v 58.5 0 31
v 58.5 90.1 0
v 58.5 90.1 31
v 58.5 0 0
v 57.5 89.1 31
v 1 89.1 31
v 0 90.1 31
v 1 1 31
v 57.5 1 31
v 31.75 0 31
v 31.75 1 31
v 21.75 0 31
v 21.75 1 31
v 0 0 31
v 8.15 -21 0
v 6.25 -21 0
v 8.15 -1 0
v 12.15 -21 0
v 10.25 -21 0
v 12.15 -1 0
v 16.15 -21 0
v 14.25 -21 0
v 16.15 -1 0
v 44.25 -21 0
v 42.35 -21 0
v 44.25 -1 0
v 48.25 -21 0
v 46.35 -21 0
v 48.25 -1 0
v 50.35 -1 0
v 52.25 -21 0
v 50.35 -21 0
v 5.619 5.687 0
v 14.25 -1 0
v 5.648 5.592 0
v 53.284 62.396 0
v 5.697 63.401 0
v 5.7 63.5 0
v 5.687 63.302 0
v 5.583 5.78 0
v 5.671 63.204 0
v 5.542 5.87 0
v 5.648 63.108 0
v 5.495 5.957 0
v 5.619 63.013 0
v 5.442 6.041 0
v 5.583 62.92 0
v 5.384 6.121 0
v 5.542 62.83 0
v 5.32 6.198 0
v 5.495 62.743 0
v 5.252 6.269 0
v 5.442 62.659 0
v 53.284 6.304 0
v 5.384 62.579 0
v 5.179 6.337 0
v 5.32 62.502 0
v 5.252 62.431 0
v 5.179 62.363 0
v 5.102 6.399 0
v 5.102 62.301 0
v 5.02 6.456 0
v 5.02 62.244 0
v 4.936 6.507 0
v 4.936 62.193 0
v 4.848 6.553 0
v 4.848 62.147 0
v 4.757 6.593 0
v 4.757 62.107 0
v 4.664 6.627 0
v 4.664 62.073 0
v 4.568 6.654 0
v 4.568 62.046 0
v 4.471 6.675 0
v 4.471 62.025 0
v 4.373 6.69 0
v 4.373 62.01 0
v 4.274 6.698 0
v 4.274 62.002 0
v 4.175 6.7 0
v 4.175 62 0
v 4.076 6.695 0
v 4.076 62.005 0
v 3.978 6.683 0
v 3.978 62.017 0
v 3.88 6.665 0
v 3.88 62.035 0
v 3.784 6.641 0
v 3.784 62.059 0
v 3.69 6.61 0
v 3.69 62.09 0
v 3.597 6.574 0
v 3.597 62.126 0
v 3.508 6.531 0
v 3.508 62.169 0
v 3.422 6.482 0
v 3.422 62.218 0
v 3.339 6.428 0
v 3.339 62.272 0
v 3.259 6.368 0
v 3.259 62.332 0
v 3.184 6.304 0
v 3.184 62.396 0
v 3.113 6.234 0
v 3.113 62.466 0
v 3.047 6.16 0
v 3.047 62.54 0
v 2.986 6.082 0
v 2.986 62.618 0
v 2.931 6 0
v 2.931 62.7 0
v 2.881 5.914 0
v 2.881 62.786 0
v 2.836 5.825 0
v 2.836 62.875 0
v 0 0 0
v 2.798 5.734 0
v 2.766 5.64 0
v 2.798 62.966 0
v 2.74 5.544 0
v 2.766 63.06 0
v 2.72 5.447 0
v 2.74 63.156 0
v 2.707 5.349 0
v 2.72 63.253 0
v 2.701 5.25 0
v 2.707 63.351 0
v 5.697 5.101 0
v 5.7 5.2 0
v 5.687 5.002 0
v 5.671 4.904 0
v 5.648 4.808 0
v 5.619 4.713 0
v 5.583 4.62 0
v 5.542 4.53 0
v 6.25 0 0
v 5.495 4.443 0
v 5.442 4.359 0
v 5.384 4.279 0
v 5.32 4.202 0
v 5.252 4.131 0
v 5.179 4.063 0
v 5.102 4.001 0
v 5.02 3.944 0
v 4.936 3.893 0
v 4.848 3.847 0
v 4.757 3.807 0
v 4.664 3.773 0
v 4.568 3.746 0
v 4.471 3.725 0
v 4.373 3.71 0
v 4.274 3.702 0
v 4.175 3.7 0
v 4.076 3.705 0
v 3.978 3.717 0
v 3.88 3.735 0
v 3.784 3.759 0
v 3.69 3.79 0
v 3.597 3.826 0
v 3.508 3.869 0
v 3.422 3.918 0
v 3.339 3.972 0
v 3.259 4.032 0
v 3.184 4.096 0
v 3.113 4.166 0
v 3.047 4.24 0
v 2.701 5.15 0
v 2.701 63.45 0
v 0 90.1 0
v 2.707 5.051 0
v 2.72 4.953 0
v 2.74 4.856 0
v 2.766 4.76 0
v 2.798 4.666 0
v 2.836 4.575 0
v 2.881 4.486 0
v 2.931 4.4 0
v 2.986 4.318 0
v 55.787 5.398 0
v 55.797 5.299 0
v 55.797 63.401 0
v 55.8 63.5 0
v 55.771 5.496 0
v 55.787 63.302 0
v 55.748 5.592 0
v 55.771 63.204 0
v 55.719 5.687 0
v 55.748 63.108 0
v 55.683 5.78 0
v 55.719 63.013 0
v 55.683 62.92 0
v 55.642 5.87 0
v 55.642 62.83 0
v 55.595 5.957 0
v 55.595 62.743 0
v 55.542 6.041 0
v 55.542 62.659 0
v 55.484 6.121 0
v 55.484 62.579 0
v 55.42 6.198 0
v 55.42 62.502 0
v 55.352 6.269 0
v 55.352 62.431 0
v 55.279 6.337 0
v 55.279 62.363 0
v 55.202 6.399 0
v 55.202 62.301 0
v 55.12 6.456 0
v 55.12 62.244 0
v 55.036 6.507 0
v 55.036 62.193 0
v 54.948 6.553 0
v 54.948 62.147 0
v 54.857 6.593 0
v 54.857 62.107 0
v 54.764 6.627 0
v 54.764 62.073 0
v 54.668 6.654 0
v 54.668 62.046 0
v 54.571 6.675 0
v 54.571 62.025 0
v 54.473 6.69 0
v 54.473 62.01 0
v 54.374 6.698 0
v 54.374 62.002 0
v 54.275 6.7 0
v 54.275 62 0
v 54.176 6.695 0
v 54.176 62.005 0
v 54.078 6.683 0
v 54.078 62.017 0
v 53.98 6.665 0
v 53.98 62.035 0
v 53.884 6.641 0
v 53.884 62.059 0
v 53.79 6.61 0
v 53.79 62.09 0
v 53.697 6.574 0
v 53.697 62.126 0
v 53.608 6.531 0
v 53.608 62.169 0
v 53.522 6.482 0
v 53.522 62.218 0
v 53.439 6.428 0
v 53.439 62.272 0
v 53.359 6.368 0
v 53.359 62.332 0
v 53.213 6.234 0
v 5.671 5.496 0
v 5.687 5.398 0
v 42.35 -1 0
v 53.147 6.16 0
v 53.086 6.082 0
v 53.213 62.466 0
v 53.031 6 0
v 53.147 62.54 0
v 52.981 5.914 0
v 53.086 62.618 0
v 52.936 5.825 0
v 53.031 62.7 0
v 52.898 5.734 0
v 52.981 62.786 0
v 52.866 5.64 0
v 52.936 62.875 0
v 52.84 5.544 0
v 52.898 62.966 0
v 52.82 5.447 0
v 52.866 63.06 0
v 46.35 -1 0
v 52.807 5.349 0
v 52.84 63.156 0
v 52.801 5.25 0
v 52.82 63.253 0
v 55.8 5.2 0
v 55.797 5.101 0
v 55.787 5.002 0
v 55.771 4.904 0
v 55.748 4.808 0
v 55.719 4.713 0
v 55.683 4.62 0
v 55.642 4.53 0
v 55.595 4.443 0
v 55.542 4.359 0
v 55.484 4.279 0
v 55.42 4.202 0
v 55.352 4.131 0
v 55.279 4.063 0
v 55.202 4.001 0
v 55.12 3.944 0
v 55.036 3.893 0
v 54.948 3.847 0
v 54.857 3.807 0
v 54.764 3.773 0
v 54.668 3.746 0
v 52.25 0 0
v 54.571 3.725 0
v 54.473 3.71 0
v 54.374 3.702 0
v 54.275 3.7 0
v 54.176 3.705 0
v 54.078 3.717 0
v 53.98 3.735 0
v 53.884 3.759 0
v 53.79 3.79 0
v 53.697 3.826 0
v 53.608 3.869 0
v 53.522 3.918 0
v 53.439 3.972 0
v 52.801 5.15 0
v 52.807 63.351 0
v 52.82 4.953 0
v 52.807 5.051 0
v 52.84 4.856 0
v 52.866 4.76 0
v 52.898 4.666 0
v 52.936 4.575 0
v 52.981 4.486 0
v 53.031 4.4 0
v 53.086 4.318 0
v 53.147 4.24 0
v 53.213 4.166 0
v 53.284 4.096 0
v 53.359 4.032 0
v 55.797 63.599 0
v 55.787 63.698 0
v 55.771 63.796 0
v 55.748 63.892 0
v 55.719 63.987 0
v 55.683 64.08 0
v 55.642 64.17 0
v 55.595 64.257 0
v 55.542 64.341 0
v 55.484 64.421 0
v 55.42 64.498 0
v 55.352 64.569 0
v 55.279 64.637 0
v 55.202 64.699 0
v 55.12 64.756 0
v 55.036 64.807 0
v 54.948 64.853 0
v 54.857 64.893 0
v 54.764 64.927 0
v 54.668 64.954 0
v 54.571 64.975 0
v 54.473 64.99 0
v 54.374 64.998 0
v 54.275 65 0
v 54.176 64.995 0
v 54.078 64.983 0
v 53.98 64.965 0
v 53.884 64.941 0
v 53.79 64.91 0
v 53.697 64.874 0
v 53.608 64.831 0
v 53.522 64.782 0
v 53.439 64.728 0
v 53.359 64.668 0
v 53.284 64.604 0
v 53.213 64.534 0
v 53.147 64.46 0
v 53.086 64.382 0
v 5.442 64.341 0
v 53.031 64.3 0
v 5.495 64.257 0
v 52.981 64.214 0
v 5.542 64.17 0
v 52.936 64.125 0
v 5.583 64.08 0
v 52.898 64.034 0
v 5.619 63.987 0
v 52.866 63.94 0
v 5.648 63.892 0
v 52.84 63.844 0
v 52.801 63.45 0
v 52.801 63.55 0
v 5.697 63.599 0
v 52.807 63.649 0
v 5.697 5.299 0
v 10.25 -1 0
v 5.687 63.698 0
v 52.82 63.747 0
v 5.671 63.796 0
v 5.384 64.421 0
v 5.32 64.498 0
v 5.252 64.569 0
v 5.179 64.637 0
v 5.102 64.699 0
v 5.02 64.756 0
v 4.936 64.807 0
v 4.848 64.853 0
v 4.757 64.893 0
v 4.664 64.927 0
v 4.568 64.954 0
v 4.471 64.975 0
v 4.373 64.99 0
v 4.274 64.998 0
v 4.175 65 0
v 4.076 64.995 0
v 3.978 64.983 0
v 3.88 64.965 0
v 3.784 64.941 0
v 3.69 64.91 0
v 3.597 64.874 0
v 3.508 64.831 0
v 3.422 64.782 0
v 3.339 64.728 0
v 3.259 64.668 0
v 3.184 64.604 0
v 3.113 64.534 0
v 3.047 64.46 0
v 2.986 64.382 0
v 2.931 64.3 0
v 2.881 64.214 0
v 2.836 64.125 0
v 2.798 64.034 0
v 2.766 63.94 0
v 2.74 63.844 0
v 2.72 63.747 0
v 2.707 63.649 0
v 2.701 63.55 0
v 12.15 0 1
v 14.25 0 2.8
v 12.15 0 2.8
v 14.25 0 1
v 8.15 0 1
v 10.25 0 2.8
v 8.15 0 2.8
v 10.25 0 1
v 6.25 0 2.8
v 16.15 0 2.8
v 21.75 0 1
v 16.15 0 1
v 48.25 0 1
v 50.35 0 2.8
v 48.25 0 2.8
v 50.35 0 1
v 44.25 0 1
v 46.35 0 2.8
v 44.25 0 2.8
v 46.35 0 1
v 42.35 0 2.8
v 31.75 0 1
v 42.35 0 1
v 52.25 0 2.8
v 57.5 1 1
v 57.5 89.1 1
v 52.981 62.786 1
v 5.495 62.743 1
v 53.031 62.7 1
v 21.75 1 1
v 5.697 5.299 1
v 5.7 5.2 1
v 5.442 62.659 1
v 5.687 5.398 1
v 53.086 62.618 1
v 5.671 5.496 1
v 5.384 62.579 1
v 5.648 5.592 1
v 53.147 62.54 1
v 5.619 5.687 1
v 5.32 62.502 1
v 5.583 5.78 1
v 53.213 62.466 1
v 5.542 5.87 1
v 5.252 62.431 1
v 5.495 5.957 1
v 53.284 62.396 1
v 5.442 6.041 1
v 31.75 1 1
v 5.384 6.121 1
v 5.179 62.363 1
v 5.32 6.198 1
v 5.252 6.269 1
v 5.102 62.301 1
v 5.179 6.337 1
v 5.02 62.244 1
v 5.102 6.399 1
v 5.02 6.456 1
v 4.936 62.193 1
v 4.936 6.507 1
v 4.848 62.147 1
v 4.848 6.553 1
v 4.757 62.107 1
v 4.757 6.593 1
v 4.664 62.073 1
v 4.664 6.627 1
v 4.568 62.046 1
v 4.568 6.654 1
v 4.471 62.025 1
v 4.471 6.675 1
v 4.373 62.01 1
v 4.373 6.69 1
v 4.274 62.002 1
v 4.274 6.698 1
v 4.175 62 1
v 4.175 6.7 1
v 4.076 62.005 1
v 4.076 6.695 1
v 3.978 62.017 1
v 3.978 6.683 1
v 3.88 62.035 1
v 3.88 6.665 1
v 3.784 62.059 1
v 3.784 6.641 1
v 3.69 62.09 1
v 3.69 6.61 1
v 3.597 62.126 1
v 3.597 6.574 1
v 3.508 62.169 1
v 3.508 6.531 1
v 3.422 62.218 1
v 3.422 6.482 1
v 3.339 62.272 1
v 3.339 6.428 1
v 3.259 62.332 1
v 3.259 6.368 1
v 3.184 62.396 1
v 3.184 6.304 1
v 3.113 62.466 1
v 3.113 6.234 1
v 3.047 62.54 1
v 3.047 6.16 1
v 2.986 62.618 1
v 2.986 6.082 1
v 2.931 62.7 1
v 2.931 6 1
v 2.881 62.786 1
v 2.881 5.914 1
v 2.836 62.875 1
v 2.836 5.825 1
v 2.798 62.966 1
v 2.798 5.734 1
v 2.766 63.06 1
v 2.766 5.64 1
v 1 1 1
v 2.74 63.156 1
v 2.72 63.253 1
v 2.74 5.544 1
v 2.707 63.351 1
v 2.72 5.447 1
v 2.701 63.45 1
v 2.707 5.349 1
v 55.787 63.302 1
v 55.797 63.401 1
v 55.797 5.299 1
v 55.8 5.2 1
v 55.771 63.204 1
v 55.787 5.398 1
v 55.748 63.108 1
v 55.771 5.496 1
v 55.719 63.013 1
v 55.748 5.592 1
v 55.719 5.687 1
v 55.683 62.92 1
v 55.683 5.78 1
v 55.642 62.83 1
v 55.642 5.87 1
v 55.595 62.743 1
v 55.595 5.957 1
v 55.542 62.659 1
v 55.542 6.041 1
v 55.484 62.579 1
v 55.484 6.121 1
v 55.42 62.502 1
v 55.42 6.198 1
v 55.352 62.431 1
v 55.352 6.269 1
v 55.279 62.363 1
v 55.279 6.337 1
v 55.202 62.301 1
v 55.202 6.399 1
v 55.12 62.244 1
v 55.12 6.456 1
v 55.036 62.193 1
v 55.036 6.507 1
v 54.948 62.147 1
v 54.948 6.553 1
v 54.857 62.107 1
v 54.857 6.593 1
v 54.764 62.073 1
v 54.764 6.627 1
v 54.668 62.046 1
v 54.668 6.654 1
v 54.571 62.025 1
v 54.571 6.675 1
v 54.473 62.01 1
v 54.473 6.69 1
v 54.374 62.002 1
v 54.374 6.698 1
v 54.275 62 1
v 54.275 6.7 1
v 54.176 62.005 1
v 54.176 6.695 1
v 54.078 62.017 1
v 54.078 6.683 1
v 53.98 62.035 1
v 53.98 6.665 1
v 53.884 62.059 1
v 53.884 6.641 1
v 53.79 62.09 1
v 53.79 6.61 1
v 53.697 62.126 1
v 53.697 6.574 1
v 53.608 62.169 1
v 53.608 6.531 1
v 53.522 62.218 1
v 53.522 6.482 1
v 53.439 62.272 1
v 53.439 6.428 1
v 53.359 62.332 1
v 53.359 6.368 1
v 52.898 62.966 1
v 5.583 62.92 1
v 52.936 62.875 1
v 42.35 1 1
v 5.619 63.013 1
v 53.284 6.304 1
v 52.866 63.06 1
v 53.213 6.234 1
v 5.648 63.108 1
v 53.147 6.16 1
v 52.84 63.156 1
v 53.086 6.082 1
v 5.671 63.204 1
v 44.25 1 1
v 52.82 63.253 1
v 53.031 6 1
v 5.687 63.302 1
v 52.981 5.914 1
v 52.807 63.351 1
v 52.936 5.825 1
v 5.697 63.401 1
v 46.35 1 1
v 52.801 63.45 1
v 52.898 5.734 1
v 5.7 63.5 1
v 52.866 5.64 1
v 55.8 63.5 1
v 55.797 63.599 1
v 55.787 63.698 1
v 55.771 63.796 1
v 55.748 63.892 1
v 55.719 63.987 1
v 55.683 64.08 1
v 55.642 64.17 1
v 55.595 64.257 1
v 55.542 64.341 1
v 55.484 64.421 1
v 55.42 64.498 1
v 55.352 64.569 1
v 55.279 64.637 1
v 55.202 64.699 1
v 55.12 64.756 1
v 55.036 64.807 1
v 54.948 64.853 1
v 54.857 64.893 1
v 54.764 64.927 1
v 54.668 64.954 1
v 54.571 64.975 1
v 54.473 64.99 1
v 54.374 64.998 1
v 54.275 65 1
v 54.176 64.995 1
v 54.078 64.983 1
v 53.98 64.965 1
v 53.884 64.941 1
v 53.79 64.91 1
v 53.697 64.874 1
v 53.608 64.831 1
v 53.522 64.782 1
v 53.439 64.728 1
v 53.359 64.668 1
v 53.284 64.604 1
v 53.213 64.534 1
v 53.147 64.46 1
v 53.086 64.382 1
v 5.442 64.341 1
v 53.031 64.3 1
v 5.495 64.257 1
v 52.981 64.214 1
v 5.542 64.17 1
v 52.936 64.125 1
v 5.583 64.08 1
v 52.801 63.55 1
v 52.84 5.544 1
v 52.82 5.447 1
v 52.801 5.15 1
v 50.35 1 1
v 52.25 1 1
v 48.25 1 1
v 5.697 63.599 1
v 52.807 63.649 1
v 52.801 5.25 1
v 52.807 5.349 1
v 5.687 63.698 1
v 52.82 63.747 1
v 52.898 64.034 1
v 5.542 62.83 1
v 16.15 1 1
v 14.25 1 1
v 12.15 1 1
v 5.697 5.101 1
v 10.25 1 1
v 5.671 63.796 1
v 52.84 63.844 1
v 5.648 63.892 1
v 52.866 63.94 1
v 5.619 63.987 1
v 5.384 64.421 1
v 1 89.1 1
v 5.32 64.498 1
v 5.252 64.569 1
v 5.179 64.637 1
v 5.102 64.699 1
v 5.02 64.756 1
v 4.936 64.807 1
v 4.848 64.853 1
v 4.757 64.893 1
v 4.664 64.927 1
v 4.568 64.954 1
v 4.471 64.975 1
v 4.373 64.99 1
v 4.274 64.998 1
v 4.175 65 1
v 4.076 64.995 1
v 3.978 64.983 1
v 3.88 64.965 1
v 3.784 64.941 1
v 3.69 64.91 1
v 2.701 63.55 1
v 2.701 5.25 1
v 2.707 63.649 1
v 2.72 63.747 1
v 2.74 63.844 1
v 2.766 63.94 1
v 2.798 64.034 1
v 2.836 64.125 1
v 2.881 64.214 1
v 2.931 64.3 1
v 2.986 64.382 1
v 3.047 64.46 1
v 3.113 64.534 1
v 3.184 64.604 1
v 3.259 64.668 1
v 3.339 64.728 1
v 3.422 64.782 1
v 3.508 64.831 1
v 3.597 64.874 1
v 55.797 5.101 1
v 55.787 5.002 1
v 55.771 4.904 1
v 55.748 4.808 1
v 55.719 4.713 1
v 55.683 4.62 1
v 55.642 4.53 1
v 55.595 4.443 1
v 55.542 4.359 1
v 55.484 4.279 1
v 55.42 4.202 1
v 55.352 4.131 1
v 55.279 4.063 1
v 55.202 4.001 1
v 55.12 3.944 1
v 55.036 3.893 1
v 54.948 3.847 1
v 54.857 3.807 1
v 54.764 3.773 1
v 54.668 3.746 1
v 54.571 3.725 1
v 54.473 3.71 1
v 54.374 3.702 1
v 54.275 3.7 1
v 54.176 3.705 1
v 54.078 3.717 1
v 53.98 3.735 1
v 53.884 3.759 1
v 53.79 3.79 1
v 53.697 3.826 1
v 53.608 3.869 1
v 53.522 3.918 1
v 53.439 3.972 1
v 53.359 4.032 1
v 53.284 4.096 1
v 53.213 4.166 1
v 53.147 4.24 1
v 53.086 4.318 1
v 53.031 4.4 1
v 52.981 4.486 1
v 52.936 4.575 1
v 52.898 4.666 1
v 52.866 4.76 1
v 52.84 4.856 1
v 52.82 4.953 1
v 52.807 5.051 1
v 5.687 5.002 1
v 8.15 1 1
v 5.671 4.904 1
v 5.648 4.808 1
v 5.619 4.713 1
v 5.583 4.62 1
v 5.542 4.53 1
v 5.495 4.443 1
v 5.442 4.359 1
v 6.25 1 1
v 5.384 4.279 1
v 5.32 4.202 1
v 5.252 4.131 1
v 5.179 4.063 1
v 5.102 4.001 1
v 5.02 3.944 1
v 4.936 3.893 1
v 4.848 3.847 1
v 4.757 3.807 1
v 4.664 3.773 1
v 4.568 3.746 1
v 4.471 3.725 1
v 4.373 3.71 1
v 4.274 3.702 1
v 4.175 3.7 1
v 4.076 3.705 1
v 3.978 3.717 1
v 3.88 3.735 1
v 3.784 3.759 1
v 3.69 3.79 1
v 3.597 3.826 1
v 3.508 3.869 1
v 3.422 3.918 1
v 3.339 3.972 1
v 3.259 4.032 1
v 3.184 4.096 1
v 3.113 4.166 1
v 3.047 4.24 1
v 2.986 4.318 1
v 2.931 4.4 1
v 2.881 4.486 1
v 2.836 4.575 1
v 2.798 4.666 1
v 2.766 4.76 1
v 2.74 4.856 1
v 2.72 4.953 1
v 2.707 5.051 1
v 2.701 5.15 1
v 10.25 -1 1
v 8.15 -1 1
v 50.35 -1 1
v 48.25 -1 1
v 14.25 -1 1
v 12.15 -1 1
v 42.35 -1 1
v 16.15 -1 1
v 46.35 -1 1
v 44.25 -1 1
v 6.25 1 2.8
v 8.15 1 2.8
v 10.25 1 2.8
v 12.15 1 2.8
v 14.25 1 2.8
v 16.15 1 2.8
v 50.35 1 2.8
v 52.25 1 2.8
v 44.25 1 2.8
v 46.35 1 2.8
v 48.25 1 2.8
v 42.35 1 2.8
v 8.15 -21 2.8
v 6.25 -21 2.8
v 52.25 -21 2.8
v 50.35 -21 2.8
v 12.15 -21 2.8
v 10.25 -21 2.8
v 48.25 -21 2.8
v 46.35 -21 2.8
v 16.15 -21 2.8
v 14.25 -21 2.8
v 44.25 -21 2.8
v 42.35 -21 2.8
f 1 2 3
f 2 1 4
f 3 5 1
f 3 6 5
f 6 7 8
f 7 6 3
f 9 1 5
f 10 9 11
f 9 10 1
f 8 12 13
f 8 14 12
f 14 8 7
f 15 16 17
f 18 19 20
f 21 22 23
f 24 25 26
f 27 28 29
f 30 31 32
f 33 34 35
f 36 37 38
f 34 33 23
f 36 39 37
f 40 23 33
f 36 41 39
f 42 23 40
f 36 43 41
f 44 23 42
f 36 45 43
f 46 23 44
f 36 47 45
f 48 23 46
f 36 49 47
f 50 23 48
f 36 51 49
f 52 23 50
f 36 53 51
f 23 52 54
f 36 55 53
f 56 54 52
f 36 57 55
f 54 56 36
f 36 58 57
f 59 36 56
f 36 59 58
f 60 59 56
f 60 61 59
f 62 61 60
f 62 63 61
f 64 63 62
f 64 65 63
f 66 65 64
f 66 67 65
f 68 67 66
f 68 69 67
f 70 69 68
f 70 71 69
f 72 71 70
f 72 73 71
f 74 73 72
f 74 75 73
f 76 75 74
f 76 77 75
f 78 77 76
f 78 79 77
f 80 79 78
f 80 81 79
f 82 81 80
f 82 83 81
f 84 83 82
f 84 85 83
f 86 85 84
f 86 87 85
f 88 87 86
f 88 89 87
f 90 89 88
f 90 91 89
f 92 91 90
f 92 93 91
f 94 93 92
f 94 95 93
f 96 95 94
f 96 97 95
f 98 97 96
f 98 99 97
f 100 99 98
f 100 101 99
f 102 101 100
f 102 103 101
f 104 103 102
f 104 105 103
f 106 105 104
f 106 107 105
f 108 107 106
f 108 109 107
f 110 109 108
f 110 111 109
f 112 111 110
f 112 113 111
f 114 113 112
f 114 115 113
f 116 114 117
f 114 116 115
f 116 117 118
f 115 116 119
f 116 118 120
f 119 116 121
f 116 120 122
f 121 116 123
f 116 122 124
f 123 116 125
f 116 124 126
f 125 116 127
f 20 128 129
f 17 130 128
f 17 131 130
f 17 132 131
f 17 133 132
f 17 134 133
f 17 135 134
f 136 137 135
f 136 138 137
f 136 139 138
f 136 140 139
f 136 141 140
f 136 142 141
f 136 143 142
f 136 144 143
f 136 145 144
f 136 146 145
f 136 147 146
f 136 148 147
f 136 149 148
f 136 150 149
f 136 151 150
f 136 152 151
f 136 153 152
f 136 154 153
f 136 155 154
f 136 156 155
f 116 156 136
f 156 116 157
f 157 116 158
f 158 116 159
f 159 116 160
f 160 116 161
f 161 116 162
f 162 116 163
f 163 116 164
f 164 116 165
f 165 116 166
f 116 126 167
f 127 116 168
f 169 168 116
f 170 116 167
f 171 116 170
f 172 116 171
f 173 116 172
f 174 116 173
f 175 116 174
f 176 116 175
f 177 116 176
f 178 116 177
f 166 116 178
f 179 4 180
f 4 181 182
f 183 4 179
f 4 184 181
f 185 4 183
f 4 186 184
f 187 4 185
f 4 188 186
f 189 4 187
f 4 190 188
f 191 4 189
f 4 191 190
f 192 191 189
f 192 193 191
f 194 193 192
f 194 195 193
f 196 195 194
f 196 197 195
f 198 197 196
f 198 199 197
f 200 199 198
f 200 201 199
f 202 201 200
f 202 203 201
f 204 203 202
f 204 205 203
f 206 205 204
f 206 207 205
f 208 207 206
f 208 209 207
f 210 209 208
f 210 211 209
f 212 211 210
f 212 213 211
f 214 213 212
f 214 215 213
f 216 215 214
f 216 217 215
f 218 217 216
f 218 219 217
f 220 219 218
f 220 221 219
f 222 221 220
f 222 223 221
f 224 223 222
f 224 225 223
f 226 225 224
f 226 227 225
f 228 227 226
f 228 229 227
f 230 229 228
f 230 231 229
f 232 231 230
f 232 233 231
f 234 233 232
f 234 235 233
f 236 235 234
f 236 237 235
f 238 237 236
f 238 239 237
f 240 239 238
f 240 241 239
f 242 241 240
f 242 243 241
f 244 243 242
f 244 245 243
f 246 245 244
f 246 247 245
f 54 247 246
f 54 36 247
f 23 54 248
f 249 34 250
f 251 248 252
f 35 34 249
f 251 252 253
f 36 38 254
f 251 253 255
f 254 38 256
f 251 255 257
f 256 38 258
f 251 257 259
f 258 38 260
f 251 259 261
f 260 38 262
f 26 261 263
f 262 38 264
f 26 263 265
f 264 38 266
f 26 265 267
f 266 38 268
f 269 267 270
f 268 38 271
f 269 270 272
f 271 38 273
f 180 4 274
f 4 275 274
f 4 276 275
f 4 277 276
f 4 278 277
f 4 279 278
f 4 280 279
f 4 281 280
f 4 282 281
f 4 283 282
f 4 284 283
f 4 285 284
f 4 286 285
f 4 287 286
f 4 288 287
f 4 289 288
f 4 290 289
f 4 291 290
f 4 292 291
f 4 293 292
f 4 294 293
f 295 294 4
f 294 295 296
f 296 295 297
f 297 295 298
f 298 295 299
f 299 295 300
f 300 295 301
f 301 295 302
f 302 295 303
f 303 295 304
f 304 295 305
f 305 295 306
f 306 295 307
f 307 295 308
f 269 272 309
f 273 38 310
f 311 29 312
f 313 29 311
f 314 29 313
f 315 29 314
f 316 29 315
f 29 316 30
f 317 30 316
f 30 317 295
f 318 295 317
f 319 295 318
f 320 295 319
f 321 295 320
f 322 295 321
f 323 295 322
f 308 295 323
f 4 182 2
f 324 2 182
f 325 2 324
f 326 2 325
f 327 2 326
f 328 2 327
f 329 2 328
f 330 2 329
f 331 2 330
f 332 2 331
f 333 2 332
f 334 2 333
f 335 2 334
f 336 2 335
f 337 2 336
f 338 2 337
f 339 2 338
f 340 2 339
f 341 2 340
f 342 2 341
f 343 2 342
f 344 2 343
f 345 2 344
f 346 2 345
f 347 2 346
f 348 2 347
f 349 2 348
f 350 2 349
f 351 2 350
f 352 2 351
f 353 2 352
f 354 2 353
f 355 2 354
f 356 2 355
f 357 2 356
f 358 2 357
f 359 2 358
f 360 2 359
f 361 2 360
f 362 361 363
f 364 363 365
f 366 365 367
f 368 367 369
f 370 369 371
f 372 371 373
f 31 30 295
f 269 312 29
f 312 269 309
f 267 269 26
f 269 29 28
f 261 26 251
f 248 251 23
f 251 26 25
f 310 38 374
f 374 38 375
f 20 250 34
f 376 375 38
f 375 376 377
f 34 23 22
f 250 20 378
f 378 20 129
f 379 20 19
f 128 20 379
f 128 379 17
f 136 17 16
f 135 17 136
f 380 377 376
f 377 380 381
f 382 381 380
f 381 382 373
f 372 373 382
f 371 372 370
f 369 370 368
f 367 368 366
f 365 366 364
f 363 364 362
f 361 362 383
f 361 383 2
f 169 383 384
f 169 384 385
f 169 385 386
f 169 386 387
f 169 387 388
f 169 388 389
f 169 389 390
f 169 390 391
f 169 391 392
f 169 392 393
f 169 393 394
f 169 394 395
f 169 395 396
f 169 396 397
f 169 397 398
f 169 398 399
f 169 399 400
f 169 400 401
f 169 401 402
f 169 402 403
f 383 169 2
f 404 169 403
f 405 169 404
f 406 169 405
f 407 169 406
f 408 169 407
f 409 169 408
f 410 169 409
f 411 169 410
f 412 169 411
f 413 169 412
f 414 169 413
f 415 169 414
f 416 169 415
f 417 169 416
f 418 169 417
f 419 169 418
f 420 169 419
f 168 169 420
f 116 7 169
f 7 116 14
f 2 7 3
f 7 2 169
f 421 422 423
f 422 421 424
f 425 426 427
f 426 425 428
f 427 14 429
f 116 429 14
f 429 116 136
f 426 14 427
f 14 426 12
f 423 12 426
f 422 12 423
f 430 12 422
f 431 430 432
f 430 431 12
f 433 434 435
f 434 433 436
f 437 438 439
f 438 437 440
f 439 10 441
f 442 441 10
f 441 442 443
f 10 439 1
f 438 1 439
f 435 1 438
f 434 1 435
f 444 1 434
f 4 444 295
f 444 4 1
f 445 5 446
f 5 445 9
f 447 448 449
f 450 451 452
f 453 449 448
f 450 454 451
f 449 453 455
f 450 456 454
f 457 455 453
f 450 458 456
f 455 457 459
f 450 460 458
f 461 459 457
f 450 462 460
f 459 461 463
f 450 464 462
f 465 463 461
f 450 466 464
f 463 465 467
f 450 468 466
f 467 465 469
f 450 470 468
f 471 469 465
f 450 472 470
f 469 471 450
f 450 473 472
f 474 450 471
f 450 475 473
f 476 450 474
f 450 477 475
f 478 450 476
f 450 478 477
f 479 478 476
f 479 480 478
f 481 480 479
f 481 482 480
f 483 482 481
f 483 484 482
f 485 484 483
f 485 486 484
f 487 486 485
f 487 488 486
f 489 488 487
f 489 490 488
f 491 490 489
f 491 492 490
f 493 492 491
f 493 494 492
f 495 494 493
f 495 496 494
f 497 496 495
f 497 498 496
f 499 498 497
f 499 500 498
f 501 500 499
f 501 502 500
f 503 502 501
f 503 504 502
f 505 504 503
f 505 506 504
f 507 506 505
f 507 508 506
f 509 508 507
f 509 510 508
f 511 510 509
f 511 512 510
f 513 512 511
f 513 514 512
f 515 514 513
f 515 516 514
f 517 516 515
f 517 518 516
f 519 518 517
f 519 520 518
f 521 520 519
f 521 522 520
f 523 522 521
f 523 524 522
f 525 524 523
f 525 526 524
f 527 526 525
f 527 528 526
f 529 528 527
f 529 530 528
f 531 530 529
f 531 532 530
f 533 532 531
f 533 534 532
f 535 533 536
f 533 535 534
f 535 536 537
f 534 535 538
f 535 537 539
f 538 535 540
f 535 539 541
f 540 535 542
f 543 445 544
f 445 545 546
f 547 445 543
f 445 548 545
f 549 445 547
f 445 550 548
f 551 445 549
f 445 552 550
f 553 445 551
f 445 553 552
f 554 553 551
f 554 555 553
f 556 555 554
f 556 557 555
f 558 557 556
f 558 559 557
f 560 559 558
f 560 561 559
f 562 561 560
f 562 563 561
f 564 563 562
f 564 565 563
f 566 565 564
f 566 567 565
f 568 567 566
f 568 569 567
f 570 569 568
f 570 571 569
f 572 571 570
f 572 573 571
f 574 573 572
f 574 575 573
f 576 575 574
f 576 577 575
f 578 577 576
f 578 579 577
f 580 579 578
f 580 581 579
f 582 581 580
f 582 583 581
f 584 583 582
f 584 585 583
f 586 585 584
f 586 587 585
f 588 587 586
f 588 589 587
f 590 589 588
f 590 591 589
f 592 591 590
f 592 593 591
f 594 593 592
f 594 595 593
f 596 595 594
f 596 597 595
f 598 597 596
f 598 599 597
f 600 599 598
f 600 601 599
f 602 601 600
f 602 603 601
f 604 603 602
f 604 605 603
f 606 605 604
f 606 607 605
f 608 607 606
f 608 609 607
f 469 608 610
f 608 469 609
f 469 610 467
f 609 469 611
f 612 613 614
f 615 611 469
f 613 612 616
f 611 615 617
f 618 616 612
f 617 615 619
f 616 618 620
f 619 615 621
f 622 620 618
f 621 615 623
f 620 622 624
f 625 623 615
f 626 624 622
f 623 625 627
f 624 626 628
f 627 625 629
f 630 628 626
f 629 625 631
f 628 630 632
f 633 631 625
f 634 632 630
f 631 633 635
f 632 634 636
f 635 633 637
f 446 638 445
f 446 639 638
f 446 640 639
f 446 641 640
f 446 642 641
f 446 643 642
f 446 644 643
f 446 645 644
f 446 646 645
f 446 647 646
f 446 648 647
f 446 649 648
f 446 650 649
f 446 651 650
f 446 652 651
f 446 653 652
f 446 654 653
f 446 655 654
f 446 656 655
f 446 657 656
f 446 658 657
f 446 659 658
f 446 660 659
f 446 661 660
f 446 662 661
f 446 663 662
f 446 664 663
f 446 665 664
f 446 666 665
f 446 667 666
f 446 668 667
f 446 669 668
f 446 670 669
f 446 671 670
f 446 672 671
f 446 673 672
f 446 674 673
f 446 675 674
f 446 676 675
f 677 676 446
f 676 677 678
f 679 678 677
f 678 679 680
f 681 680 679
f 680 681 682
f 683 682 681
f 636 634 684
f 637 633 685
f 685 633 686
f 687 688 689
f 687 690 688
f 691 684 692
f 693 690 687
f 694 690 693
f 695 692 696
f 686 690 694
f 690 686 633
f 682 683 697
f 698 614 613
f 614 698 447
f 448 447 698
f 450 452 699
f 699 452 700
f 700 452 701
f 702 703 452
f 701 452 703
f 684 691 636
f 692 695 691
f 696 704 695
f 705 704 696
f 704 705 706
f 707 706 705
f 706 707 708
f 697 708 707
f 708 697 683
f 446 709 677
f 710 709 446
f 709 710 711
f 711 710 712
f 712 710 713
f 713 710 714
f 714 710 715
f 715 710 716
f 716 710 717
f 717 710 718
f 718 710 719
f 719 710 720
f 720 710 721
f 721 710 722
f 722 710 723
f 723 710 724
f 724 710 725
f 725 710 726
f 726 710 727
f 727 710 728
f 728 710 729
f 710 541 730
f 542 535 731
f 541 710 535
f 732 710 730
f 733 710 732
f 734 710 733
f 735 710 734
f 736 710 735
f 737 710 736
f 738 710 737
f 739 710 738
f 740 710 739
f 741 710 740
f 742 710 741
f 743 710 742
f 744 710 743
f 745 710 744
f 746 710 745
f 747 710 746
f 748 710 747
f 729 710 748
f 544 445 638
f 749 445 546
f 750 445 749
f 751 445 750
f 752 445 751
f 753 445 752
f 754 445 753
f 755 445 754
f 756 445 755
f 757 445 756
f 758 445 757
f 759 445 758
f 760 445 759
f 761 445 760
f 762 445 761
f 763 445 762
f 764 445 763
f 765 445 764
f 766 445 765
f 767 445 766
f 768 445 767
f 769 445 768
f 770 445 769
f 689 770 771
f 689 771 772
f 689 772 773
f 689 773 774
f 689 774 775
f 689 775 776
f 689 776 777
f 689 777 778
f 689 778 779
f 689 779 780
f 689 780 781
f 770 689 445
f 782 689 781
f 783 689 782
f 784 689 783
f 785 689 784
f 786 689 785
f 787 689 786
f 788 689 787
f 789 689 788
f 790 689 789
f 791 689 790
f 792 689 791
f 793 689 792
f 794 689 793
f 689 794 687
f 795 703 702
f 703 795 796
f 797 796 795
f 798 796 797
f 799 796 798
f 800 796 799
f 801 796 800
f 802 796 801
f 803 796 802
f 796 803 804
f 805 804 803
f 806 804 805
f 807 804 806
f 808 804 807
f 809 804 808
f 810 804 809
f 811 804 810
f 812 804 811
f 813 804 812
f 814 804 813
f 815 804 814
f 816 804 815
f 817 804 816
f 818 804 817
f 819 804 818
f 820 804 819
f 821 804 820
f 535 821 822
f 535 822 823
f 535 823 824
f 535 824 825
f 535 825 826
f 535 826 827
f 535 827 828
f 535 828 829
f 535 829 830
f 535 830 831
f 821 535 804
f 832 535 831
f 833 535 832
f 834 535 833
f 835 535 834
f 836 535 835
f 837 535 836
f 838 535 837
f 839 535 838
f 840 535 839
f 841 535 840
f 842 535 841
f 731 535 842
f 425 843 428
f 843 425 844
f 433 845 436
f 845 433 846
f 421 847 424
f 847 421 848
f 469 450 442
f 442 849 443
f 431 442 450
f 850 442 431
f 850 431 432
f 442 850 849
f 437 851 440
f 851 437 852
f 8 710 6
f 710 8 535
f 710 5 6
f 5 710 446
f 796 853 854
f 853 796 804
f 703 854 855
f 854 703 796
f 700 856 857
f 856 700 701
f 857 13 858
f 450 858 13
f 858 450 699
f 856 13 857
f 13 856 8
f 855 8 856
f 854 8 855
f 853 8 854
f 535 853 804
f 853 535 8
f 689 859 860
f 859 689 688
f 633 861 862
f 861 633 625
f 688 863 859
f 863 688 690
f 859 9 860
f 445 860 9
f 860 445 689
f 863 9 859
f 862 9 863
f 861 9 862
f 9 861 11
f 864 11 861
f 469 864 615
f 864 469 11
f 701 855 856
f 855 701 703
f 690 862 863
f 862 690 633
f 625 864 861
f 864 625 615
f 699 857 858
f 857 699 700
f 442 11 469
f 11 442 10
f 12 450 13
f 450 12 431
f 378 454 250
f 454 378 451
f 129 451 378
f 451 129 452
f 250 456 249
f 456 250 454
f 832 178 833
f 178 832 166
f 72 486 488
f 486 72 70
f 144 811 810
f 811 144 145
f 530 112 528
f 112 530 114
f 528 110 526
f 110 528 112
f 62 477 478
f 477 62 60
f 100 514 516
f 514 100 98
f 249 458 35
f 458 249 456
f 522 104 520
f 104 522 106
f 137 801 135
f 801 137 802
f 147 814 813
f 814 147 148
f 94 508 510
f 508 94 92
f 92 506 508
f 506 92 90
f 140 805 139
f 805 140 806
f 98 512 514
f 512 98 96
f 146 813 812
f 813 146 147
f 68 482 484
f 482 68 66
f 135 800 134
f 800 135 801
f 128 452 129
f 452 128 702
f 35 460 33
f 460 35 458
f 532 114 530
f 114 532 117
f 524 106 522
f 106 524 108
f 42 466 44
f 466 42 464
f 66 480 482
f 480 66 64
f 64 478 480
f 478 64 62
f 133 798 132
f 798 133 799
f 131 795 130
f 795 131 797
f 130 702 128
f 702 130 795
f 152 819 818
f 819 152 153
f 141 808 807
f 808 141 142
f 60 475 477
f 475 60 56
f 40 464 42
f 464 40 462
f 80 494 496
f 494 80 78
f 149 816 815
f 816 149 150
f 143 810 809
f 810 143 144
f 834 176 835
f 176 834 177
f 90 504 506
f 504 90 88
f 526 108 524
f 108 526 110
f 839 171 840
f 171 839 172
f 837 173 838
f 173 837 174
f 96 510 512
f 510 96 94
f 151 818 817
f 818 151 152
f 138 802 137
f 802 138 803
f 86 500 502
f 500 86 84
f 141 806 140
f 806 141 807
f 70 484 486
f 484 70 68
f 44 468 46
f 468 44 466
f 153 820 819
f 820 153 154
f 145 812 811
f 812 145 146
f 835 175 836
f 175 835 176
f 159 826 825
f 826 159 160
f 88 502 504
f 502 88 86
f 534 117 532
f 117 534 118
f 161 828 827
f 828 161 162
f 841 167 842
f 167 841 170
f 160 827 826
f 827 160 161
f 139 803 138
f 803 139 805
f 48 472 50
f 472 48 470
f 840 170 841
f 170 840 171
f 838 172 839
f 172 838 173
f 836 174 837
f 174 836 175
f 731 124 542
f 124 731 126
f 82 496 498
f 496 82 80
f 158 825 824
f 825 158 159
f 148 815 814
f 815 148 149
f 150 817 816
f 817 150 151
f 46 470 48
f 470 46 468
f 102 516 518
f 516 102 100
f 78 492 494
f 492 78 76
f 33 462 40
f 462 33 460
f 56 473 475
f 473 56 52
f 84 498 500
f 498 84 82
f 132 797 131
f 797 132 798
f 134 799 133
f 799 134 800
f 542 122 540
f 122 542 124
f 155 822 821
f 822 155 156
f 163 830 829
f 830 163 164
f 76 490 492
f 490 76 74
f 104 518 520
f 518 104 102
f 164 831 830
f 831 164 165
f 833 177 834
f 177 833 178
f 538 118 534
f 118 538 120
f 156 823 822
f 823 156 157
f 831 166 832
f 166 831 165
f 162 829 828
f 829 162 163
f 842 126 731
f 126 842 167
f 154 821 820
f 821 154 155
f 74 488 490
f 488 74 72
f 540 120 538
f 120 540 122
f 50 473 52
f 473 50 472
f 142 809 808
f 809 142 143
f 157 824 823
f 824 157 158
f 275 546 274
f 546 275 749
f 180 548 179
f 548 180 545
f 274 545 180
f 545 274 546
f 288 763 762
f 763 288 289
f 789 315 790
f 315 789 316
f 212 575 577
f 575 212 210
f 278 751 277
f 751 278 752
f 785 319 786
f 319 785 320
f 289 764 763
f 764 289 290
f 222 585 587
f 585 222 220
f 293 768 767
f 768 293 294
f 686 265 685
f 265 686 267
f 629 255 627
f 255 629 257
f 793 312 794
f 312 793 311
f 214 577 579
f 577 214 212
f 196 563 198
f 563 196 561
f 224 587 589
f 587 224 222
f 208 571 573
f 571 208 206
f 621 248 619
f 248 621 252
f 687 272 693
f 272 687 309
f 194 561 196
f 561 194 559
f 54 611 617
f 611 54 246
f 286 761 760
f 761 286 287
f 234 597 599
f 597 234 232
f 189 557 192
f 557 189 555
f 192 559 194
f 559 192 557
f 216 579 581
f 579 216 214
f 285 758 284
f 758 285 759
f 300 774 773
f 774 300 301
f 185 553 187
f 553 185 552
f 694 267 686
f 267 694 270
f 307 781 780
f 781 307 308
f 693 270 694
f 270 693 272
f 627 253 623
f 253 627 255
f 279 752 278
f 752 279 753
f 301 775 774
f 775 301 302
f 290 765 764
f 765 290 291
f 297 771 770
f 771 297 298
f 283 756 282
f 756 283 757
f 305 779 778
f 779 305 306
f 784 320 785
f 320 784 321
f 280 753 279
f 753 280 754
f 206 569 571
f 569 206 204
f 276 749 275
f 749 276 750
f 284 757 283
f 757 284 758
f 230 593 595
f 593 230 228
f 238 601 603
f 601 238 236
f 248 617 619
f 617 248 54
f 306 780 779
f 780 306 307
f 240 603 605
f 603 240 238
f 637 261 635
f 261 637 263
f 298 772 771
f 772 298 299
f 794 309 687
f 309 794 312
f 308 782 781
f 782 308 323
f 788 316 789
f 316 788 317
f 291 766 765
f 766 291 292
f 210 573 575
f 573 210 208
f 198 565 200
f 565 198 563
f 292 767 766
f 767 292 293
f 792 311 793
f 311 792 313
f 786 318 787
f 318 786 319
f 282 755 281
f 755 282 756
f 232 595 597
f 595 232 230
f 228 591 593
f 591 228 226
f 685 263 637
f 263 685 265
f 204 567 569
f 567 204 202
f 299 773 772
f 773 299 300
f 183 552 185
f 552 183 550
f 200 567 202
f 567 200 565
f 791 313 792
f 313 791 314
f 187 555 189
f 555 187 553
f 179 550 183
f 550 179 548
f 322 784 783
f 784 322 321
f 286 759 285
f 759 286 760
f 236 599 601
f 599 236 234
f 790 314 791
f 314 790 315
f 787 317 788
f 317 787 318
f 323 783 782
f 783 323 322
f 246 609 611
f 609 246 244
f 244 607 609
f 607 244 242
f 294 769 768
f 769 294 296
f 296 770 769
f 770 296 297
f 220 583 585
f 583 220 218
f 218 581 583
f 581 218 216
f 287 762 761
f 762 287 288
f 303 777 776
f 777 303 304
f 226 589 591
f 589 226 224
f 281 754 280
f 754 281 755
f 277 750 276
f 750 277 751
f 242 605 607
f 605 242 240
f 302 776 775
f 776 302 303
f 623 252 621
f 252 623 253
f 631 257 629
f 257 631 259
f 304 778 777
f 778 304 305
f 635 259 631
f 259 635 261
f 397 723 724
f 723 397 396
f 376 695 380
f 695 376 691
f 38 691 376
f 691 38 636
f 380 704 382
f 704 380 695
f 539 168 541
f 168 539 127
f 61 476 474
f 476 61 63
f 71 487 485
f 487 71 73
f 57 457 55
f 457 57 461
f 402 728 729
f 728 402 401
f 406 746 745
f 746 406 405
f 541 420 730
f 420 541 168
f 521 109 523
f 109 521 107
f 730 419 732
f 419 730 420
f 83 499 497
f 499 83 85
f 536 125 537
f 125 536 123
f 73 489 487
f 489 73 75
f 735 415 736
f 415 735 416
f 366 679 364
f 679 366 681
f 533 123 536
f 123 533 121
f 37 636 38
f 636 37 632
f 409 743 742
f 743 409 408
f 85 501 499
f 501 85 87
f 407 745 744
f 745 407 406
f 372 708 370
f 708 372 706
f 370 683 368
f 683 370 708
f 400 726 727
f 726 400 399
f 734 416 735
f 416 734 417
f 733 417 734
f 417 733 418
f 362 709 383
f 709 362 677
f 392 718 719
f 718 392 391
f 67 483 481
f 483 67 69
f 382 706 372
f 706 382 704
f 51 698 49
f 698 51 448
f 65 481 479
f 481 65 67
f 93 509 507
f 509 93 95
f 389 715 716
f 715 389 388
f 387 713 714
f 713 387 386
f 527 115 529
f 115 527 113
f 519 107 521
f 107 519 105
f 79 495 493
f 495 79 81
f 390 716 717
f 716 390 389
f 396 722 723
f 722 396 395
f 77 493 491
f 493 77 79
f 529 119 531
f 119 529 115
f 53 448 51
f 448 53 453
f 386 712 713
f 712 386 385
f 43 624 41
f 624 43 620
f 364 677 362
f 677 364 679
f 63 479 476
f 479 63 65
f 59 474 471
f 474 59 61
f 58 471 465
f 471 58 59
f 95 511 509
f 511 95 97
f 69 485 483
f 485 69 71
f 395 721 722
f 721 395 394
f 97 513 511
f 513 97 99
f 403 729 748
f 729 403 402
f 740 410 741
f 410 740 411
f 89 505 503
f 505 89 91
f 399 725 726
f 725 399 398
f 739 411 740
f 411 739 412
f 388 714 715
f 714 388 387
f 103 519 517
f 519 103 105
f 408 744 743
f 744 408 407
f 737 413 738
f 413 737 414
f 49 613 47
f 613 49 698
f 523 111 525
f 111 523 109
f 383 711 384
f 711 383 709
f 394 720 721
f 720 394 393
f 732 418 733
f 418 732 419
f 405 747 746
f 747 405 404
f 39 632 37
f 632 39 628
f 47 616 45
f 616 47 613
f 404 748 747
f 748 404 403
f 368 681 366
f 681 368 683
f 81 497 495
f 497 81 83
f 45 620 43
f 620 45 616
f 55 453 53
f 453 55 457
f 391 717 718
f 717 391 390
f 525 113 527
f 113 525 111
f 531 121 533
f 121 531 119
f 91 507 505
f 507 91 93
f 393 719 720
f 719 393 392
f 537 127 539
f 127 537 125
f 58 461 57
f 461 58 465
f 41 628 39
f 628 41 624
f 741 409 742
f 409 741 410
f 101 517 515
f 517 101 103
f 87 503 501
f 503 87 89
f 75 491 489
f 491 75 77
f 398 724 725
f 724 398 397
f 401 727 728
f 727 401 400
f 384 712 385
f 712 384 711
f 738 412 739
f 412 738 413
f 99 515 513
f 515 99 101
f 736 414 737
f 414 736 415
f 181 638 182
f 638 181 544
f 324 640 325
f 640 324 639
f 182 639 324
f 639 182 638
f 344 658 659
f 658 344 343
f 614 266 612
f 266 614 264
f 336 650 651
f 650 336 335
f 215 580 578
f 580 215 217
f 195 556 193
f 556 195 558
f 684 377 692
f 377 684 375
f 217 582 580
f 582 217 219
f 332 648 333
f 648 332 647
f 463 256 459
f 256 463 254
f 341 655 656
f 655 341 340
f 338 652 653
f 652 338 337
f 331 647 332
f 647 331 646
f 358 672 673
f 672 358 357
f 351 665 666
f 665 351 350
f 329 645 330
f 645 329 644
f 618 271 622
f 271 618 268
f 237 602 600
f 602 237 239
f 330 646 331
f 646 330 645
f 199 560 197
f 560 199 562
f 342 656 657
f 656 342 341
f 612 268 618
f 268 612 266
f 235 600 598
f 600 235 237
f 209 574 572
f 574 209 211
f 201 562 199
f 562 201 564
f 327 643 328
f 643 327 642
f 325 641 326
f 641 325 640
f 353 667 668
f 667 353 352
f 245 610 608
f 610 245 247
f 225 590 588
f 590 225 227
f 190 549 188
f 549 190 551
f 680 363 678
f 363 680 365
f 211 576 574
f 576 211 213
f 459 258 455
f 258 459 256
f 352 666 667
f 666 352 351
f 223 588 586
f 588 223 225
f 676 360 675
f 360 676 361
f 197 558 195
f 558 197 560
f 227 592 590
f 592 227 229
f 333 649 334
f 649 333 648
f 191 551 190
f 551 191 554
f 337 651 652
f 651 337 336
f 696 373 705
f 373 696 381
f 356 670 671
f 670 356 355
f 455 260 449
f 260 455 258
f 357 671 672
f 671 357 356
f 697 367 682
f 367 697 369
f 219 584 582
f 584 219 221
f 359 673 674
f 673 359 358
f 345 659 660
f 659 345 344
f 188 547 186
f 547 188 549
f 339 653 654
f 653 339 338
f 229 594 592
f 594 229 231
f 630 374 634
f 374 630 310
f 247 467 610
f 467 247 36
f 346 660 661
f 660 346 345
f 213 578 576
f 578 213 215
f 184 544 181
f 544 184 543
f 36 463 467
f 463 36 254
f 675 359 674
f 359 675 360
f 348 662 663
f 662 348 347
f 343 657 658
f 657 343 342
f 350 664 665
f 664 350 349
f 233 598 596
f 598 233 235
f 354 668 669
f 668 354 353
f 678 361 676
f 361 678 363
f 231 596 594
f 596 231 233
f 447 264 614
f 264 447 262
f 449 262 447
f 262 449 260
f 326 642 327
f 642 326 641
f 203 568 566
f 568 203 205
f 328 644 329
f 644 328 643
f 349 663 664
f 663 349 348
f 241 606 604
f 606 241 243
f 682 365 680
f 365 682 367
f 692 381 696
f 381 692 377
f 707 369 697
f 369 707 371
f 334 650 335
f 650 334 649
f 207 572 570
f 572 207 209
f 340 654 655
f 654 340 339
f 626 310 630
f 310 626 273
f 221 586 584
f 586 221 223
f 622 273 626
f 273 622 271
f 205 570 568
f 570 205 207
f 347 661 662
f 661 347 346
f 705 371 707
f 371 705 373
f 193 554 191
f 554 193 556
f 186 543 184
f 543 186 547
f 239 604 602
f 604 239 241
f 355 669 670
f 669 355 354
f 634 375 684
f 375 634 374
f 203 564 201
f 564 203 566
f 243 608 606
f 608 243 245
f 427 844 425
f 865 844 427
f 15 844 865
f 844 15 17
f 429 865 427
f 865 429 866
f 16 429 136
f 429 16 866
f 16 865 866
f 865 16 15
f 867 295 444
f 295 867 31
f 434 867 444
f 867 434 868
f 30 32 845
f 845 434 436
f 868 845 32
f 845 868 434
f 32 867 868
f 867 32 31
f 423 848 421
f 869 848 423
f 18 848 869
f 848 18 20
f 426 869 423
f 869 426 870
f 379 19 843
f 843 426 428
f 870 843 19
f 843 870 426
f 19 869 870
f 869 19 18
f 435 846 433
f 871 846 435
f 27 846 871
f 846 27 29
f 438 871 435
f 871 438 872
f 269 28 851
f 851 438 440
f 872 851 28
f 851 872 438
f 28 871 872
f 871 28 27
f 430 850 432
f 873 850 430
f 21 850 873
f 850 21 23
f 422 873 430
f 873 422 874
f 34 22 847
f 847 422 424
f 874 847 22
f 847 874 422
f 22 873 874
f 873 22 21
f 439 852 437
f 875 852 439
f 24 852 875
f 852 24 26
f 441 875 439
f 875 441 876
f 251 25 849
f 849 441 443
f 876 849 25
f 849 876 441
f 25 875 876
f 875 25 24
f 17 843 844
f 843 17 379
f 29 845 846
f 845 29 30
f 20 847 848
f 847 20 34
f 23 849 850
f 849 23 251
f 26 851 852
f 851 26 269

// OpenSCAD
ribs_total_width = 42.2;
rib_width = 1.9;
rib_depth = 2.8;
rib_spacing = 4.0;
rpi_height = 27; //Excluding the ribs.
nvme_width = 56.5;
nvme_length = 88.1;
nvme_pin_x = 3.2;
nvme_close_pin_y = 4.2;
nvme_far_pin_y = 62.5;
nvme_height = 30;
ribbon_offset_x = 2.5;
ribbon_width = 10;



t = 1; //Thickness.
p = 0.2; //Play.
space = 1;
rib_connector_length = 20;
screw_radius = 1.5;
$fa = 1;
$fs = 0.1;

difference() {
	cube([nvme_width + t * 2, nvme_length + t * 2, nvme_height + t]);
	translate([t, t, t]) {
		cube([nvme_width, nvme_length, nvme_height + t + 1]);
	}
	translate([t + nvme_width / 2 - ribbon_width / 2 - ribbon_offset_x, -1, t]) {
		cube([ribbon_width, t + 2, nvme_height + 1]);
	}
	translate([t + nvme_pin_x, t + nvme_close_pin_y, -1]) {
		cylinder(h=t + 2, r=screw_radius);
	}
	translate([t + nvme_width - nvme_pin_x, t + nvme_close_pin_y, -1]) {
		cylinder(h=t + 2, r=screw_radius);
	}
	translate([t + nvme_pin_x, t + nvme_far_pin_y, -1]) {
		cylinder(h=t + 2, r=screw_radius);
	}
	translate([t + nvme_width - nvme_pin_x, t + nvme_far_pin_y, -1]) {
		cylinder(h=t + 2, r=screw_radius);
	}
}

translate([t + nvme_width / 2 - ribs_total_width / 2 - rib_width, -space - rib_connector_length, 0]) {
	cube([rib_width, rib_connector_length + space + t, rib_depth]);
}
translate([t + nvme_width / 2 + ribs_total_width / 2, -space - rib_connector_length, 0]) {
	cube([rib_width, rib_connector_length + space + t, rib_depth]);
}
translate([t + nvme_width / 2 - ribs_total_width / 2 - rib_width + rib_spacing, -space - rib_connector_length, 0]) {
	cube([rib_width, rib_connector_length + space + t, rib_depth]);
}
translate([t + nvme_width / 2 + ribs_total_width / 2 - rib_spacing, -space - rib_connector_length, 0]) {
	cube([rib_width, rib_connector_length + space + t, rib_depth]);
}
translate([t + nvme_width / 2 - ribs_total_width / 2 - rib_width + rib_spacing * 2, -space - rib_connector_length, 0]) {
	cube([rib_width, rib_connector_length + space + t, rib_depth]);
}
translate([t + nvme_width / 2 + ribs_total_width / 2 - rib_spacing * 2, -space - rib_connector_length, 0]) {
	cube([rib_width, rib_connector_length + space + t, rib_depth]);
}
translate([t + nvme_width / 2 - ribs_total_width / 2 - rib_width, -space, 0]) {
	cube([rib_width * 2 + ribs_total_width, space + t, t]);
}
